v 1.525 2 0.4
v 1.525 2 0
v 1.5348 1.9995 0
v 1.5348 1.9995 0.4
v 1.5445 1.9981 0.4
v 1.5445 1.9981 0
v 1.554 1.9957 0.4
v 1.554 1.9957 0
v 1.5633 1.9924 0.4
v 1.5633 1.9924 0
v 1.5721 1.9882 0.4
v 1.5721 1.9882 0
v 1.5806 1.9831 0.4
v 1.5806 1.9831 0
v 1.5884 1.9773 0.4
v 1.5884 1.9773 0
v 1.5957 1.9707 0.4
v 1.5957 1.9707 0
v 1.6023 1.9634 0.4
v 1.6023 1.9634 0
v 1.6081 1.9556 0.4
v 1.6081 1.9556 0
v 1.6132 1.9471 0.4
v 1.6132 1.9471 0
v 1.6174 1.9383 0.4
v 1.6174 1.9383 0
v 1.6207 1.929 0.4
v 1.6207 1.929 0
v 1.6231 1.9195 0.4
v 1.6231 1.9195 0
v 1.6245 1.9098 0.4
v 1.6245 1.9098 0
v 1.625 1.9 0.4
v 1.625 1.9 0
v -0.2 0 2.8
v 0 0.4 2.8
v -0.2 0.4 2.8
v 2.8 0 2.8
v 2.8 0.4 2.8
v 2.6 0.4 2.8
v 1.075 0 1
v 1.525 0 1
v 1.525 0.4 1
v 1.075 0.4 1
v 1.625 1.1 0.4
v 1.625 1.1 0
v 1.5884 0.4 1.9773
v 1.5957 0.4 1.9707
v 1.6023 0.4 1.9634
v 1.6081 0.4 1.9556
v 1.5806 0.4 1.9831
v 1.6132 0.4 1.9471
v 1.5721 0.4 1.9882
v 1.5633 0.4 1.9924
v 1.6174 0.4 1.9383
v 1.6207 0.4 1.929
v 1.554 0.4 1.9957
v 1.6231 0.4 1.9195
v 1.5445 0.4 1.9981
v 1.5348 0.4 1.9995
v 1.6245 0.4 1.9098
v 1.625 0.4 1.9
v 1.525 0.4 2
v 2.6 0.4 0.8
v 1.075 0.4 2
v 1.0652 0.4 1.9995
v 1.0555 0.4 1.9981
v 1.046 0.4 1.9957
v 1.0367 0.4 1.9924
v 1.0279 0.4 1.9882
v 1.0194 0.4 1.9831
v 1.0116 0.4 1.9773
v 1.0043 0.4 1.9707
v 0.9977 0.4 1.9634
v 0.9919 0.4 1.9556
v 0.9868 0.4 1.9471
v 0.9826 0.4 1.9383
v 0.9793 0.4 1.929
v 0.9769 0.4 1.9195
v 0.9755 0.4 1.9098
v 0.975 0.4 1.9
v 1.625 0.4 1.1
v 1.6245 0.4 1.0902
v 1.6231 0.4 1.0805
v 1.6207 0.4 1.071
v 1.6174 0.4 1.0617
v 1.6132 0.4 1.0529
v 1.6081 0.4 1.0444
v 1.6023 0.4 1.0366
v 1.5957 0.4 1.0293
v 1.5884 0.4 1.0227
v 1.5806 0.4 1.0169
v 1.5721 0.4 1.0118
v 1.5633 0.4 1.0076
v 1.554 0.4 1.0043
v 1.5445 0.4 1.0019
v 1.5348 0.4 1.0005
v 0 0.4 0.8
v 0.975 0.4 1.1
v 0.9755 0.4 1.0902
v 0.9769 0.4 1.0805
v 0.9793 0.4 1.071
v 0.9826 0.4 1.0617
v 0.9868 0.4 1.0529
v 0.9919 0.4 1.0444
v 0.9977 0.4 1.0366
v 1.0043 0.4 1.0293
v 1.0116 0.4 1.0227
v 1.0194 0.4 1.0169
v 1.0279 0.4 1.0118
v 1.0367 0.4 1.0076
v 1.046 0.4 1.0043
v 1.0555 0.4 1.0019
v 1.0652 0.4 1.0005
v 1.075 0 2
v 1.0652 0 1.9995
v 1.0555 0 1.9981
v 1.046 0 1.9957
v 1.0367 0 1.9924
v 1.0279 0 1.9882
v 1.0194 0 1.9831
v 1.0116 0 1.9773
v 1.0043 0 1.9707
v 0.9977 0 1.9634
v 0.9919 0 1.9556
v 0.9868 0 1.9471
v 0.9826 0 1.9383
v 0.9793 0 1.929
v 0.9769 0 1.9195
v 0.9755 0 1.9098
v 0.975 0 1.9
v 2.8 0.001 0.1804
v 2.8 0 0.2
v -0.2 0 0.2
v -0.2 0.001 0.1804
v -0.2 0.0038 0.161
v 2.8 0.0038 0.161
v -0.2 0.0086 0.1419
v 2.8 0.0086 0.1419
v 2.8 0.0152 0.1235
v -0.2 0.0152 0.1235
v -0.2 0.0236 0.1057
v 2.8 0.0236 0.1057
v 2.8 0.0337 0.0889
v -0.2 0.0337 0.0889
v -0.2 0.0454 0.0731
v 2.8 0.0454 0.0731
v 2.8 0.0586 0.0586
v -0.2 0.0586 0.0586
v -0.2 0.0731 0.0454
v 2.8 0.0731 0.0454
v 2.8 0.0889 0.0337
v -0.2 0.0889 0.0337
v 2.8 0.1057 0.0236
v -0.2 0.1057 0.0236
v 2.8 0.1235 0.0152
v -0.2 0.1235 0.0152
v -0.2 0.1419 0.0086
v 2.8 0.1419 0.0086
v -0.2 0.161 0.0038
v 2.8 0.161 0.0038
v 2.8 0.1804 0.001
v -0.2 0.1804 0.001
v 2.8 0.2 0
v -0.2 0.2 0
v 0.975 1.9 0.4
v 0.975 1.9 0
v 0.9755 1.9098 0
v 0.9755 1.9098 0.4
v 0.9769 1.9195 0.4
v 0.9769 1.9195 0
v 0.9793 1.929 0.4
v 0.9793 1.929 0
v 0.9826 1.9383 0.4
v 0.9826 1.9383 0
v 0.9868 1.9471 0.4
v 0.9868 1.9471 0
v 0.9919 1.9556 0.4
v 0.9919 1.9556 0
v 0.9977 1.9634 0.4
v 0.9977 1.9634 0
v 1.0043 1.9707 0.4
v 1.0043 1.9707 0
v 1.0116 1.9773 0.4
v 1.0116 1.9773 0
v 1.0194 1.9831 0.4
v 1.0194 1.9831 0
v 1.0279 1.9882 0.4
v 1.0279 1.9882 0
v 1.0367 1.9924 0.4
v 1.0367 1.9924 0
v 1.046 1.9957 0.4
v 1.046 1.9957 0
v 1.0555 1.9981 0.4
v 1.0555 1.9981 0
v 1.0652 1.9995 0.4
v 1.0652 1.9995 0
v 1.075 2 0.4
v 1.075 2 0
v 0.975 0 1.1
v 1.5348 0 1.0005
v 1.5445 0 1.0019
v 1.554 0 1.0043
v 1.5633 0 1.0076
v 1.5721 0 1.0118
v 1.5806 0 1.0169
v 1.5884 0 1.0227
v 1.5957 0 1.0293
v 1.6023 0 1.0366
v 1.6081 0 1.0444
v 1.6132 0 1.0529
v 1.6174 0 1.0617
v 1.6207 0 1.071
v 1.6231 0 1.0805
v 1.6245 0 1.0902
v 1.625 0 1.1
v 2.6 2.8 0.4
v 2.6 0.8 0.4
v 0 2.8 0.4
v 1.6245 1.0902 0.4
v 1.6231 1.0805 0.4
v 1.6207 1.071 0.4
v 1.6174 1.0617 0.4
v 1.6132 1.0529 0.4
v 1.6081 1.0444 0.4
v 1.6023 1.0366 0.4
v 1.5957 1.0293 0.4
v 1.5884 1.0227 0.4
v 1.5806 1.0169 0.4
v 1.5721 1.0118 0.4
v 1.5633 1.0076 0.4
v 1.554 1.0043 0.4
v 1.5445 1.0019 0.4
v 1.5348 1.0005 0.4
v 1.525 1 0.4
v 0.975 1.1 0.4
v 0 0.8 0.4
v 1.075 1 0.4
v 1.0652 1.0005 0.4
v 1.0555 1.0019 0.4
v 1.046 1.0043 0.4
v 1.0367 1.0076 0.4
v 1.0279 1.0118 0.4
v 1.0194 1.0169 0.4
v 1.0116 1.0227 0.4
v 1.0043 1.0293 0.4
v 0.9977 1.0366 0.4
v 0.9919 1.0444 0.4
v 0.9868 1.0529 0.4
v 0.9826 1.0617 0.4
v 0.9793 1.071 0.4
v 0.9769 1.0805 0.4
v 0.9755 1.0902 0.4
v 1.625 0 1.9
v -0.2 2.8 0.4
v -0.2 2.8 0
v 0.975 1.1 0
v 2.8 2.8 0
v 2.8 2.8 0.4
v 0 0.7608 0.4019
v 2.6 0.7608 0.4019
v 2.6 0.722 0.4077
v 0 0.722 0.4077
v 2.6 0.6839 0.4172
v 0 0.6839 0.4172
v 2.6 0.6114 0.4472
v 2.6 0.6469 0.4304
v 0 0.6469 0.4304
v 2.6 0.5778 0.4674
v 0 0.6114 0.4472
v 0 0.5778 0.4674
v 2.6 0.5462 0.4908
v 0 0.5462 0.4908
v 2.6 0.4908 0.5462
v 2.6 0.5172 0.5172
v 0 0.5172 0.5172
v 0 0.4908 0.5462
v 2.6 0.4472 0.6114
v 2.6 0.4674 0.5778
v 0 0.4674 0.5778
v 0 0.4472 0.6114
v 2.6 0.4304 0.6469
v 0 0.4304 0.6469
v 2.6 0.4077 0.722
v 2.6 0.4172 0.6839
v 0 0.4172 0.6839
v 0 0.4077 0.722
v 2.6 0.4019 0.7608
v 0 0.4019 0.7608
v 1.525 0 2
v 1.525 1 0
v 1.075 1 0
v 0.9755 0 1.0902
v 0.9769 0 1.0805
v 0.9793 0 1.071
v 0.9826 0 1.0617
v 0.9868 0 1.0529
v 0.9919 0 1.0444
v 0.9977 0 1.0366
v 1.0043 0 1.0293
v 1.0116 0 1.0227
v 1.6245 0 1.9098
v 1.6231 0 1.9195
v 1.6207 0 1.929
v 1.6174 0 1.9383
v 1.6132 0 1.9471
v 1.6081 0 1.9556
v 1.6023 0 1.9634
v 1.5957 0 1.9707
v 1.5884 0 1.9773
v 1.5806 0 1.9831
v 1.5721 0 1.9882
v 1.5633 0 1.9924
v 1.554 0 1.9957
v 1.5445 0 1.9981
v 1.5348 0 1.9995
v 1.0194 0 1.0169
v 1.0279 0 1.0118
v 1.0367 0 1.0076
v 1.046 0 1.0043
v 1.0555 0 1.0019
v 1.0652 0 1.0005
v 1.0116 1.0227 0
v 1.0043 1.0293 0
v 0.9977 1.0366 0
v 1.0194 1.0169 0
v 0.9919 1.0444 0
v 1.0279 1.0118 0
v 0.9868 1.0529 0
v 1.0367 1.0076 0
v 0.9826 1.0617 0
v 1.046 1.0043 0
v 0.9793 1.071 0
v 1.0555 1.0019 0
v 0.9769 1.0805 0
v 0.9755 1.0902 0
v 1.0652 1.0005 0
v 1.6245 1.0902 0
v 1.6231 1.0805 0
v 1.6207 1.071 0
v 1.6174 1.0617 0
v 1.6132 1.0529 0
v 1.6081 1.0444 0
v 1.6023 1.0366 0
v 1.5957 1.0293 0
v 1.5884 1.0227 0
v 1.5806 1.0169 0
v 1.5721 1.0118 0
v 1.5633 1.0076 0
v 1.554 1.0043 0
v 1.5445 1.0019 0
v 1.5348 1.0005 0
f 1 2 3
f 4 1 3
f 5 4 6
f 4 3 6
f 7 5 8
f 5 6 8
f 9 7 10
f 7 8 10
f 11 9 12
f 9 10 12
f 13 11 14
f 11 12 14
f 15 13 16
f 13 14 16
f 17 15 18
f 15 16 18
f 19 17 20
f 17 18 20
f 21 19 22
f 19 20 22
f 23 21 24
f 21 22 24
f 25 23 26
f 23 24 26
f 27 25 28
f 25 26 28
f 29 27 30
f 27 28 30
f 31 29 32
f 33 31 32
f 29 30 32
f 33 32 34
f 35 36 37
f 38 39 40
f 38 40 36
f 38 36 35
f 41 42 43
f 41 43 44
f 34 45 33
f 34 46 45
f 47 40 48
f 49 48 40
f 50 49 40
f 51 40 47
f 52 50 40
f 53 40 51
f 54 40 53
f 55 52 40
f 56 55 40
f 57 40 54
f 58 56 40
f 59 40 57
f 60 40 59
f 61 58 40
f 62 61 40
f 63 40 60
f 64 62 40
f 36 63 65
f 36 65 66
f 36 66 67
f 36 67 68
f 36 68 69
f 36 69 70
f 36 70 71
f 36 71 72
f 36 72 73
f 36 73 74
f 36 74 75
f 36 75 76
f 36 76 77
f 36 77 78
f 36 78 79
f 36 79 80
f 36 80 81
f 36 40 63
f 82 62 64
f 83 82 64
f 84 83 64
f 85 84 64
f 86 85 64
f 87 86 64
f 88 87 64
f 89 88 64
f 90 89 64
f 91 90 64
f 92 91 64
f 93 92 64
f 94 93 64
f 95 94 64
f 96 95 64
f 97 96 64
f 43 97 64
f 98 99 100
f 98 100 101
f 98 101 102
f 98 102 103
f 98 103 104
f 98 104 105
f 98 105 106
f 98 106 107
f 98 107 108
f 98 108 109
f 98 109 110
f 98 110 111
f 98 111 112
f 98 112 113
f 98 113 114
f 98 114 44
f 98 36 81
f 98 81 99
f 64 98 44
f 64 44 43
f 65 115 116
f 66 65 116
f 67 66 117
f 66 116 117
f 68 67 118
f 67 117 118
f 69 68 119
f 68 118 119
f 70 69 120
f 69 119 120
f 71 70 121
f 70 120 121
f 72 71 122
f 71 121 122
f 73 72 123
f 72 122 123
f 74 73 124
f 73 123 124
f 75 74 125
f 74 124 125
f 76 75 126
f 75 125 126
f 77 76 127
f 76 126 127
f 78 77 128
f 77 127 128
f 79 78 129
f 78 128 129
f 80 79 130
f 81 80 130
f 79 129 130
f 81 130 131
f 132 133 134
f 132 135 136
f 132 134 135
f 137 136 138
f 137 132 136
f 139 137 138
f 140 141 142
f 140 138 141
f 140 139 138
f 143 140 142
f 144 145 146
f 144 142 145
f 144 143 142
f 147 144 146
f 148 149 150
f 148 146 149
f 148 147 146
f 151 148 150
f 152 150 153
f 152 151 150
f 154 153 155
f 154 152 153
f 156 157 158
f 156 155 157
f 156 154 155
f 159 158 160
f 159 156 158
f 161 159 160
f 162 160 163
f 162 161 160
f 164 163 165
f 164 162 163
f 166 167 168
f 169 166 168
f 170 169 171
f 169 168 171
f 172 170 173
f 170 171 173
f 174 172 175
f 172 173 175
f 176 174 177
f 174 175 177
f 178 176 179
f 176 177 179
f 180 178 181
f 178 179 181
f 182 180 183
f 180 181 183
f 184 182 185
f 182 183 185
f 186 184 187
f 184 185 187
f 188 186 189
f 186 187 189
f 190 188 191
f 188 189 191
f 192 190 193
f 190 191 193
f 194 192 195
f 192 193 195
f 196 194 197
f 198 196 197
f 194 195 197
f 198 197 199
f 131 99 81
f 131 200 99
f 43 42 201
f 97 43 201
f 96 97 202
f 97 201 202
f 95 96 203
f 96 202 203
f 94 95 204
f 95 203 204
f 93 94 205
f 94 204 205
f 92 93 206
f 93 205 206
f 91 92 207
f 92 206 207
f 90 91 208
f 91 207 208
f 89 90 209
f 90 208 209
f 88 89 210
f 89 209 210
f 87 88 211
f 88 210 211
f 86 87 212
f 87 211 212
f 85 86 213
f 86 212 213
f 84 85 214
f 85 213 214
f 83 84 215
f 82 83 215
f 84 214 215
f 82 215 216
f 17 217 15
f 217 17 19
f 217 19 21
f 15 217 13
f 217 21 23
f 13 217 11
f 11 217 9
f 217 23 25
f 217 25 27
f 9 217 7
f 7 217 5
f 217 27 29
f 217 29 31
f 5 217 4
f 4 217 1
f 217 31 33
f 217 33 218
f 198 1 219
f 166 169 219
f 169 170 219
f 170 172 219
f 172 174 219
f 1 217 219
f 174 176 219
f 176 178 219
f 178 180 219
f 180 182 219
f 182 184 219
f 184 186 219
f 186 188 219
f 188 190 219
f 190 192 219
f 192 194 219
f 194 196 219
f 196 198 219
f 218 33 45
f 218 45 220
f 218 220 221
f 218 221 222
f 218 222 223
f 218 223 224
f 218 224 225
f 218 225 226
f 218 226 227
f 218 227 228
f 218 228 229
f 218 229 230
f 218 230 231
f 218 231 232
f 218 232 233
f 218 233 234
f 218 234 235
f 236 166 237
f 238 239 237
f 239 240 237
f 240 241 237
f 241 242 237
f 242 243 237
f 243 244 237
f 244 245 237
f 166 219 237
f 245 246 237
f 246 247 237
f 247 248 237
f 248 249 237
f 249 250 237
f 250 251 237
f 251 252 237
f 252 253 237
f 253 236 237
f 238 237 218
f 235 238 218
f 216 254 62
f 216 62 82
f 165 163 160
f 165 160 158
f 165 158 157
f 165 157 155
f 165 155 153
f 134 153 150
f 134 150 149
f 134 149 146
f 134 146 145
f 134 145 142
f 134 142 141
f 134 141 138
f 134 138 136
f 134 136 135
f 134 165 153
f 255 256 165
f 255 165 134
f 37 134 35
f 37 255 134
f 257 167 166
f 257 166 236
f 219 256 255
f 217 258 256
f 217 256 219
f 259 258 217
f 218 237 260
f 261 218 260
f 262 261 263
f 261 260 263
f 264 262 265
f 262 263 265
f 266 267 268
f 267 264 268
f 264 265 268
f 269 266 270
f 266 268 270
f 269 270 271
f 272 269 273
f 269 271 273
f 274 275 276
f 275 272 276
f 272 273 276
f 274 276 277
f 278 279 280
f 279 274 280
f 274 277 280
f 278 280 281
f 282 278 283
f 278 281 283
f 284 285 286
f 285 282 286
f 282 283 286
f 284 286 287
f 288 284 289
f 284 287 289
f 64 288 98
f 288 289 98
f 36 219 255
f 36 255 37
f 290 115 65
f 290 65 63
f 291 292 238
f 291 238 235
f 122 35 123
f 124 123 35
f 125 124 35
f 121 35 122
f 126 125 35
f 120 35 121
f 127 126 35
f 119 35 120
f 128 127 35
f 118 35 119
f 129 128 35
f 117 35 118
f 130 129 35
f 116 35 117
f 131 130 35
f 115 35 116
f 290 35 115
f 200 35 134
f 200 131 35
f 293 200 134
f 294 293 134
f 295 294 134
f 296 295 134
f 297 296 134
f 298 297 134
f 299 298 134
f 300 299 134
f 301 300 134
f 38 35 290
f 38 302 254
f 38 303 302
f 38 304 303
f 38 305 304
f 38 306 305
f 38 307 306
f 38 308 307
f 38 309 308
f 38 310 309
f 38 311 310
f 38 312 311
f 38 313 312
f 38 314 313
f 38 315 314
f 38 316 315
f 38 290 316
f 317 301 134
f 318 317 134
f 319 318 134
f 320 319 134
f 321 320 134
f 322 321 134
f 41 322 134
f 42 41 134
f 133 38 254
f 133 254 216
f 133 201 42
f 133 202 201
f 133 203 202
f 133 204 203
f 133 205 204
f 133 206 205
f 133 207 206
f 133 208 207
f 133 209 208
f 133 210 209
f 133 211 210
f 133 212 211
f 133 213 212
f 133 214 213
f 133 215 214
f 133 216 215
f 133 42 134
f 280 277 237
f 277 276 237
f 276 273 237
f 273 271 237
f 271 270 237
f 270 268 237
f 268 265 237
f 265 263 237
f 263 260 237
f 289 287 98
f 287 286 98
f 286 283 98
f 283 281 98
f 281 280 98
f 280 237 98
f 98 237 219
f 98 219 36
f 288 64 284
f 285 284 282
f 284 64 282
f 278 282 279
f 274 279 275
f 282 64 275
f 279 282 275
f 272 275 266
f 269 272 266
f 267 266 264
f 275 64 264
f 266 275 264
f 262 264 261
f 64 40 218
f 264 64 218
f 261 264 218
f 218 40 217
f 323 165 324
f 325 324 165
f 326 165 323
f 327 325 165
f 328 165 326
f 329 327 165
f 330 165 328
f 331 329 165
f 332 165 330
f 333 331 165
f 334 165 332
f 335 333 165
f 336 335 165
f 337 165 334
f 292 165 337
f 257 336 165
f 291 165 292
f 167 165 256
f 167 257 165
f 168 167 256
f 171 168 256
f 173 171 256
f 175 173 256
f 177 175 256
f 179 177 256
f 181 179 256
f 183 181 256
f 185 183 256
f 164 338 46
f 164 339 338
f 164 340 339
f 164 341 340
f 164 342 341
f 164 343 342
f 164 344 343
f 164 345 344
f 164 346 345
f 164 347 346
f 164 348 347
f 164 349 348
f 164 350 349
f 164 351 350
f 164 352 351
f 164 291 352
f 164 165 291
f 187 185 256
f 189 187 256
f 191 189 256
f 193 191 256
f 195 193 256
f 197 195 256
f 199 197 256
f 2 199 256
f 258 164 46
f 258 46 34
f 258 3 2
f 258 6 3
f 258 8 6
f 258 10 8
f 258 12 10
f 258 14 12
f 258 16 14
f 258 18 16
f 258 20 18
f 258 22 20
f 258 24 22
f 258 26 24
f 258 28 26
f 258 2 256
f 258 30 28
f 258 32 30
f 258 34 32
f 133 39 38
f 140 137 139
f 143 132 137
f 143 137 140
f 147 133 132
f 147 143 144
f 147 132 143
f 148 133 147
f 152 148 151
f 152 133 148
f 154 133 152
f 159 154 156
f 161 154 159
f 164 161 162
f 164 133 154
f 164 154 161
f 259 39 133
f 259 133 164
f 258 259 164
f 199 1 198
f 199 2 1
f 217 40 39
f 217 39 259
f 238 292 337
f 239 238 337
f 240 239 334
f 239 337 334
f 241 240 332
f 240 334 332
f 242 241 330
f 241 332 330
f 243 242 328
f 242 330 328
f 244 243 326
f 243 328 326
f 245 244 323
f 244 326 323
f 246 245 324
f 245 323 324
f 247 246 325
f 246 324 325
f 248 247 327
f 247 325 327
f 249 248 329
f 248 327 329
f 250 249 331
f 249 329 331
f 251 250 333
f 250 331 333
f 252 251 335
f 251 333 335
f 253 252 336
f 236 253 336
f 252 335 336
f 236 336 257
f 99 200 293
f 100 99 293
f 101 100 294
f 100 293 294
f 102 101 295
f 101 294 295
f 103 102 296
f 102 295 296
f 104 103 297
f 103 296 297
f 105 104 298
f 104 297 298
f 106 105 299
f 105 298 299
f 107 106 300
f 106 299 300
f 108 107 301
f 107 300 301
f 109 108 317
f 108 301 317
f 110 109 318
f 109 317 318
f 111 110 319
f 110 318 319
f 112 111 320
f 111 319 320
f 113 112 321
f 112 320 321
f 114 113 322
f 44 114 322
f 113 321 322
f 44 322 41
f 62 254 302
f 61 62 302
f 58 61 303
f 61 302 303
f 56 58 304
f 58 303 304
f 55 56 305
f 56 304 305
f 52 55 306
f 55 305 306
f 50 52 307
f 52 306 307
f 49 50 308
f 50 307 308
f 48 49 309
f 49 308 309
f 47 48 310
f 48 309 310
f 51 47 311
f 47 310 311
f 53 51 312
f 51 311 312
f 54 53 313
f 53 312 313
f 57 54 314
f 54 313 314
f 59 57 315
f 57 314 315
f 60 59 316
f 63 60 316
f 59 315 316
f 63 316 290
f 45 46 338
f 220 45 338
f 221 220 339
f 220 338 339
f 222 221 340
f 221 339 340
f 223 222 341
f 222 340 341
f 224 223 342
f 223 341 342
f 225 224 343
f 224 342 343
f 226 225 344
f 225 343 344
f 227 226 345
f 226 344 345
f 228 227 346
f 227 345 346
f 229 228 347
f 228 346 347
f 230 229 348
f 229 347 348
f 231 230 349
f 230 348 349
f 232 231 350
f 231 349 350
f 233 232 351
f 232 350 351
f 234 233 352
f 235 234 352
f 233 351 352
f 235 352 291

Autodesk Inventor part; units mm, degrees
ref_plane "YZ Plane" through (0, 0, 0) normal (1, 0, 0) x (0, 1, 0)
ref_plane "XZ Plane" through (0, 0, 0) normal (0, 1, 0) x (-1, 0, 0)
ref_plane "XY Plane" through (0, 0, 0) normal (0, 0, 1) x (1, 0, 0)
sketch "Skizze2" plane through (0, 0, 0) normal (1, 0, 0) x (0, 1, 0)
  line L0 (0, 0) -> (2.8, 0) construction
  line L1 (2.8, 0) -> (2.8, 2.8) construction
  line L2 (2.8, 2.8) -> (0, 2.8) construction
  line L3 (0, 2.8) -> (0, 0) construction
  line L4 (0.4, 2.8) -> (0.4, 0) construction
  line L5 (0, 0.4) -> (2.8, 0.4) construction
  line L6 (0, 0.2) -> (0, 2.8)
  line L7 (0.4, 2.8) -> (0.4, 0.8)
  line L8 (2.8, 0.4) -> (0.8, 0.4)
  line L9 (0, 2.8) -> (0.4, 2.8)
  line L10 (2.8, 0) -> (2.8, 0.4)
  line L11 (2.8, 0) -> (0.2, 0)
  arc A0 (0, 0.2) -> (0.2, 0) centre (0.2, 0.2) ccw
  arc A1 (0.4, 0.8) -> (0.8, 0.4) centre (0.8, 0.8) ccw
  point P0 (0.4, 0.4)
  dimension "d0" = 2.8
  dimension "d1" = 2.8
  dimension "d2" = 0.4
  dimension "d3" = 0.4
  dimension "d4" = 0.2
  dimension "d5" = 0.4
extrude "Extrusion1" add sketch "Skizze2" along normal blind 2.6
sketch "Skizze3" plane through (2.6, 0, 0) normal (1, 0, 0) x (0, 0, -1)
  line L0 (0, 2.8) -> (-0.4, 2.8) projected
  line L1 (-0.4, 2.8) -> (-0.4, 0.8) construction
  arc A0 (-0.8, 0.4) -> (-0.4, 0.8) centre (-0.8, 0.8) ccw construction
  line L2 (-0.8, 0.4) -> (-2.8, 0.4) construction
  line L3 (-2.8, 0.4) -> (-2.8, 0) projected
  line L4 (-2.8, 0) -> (-0.2, 0) projected
  arc A1 (-0.2, 0) -> (0, 0.2) centre (-0.2, 0.2) ccw projected
  line L5 (0, 0.2) -> (0, 2.8) projected
  line L6 (-2.8, 0.4) -> (-2.8, 0) projected
  line L7 (-2.8, 0.4) -> (-0.4, 2.8)
  point P0 (0, 0)
extrude "Extrusion2" add sketch "Skizze3" along normal blind 0.2
sketch "Skizze4" plane through (0, 0, 0) normal (-1, 0, 0) x (0, 0, 1)
  line L0 (0, 2.8) -> (0.4, 2.8) projected
  line L1 (0, 0.2) -> (0, 2.8) projected
  arc A0 (0, 0.2) -> (0.2, 0) centre (0.2, 0.2) ccw projected
  line L2 (2.8, 0) -> (0.2, 0) projected
  line L3 (2.8, 0.4) -> (2.8, 0) projected
  line L4 (0.8, 0.4) -> (2.8, 0.4) construction
  arc A1 (0.4, 0.8) -> (0.8, 0.4) centre (0.8, 0.8) ccw construction
  line L5 (0.4, 2.8) -> (0.4, 0.8) construction
  line L6 (0, 2.8) -> (0.4, 2.8) projected
  line L7 (2.8, 0.4) -> (2.8, 0) projected
  line L8 (0.4, 2.8) -> (2.8, 0.4)
  point P0 (0, 0)
extrude "Extrusion3" add sketch "Skizze4" along normal blind 0.2
sketch "Skizze5" plane through (2.8, 0, 0.2) normal (0, -1, 0) x (1, 0, 0)
  line L0 (-3, 0) -> (0, 0) construction
  line L1 (0, 2.6) -> (0, 0) construction
  line L2 (-3, 2.6) -> (0, 2.6) construction
  line L3 (-3, 0) -> (-3, 2.6) construction
  line L4 (-1.5, 2.6) -> (-1.5, 0) construction
  line L5 (-3, 0) -> (0, 0) projected
  line L6 (-3, 0) -> (-3, 2.6) construction
  line L7 (-3, 1.3) -> (0, 1.3) construction
  line L8 (-1.725, 1.8) -> (-1.275, 1.8)
  line L9 (-1.175, 1.7) -> (-1.175, 0.9)
  line L10 (-1.275, 0.8) -> (-1.725, 0.8)
  line L11 (-1.825, 0.9) -> (-1.825, 1.7)
  arc A0 (-1.725, 1.8) -> (-1.825, 1.7) centre (-1.725, 1.7) ccw
  arc A1 (-1.275, 0.8) -> (-1.175, 0.9) centre (-1.275, 0.9) ccw
  arc A2 (-1.825, 0.9) -> (-1.725, 0.8) centre (-1.725, 0.9) ccw
  arc A3 (-1.175, 1.7) -> (-1.275, 1.8) centre (-1.275, 1.7) ccw
  point P0 (-2.8, -0.2)
  point P1 (-1.825, 1.8)
  point P2 (-1.175, 1.8)
  point P3 (-1.825, 0.8)
  point P4 (-1.825, 1.3)
  point P5 (-1.5, 1.8)
  dimension "d12" = 0.65
  dimension "d13" = 1
  dimension "d14" = 0.1
extrude "Extrusion4" cut sketch "Skizze5" against normal blind 0.4
sketch "Skizze6" plane through (2.8, 0.2, 0) normal (0, 0, -1) x (-1, 0, 0)
  line L0 (0, 2.6) -> (3, 2.6) construction
  line L1 (0, 0) -> (0, 2.6) construction
  line L2 (3, 0) -> (0, 0) construction
  line L3 (3, 2.6) -> (3, 0) construction
  line L4 (3, 0) -> (0, 0) construction
  line L5 (1.5, 0) -> (1.5, 2.6) construction
  line L6 (2.8, 2.6) -> (0.2, 2.6) construction
  line L7 (3, 1.3) -> (0, 1.3) construction
  line L8 (1.725, 0.8) -> (1.275, 0.8)
  line L9 (1.175, 0.9) -> (1.175, 1.7)
  line L10 (1.275, 1.8) -> (1.725, 1.8)
  line L11 (1.825, 1.7) -> (1.825, 0.9)
  arc A0 (1.175, 0.9) -> (1.275, 0.8) centre (1.275, 0.9) ccw
  arc A1 (1.275, 1.8) -> (1.175, 1.7) centre (1.275, 1.7) ccw
  arc A2 (1.825, 1.7) -> (1.725, 1.8) centre (1.725, 1.7) ccw
  arc A3 (1.725, 0.8) -> (1.825, 0.9) centre (1.725, 0.9) ccw
  point P0 (2.8, -0.2)
  point P1 (1.825, 0.8)
  point P2 (1.175, 0.8)
  point P3 (1.825, 1.8)
  point P4 (1.5, 0.8)
  point P5 (1.175, 1.3)
  dimension "d17" = 1
  dimension "d18" = 0.65
  dimension "d19" = 0.1
extrude "Extrusion5" cut sketch "Skizze6" against normal blind 0.4
properties part number "item_winkel"
